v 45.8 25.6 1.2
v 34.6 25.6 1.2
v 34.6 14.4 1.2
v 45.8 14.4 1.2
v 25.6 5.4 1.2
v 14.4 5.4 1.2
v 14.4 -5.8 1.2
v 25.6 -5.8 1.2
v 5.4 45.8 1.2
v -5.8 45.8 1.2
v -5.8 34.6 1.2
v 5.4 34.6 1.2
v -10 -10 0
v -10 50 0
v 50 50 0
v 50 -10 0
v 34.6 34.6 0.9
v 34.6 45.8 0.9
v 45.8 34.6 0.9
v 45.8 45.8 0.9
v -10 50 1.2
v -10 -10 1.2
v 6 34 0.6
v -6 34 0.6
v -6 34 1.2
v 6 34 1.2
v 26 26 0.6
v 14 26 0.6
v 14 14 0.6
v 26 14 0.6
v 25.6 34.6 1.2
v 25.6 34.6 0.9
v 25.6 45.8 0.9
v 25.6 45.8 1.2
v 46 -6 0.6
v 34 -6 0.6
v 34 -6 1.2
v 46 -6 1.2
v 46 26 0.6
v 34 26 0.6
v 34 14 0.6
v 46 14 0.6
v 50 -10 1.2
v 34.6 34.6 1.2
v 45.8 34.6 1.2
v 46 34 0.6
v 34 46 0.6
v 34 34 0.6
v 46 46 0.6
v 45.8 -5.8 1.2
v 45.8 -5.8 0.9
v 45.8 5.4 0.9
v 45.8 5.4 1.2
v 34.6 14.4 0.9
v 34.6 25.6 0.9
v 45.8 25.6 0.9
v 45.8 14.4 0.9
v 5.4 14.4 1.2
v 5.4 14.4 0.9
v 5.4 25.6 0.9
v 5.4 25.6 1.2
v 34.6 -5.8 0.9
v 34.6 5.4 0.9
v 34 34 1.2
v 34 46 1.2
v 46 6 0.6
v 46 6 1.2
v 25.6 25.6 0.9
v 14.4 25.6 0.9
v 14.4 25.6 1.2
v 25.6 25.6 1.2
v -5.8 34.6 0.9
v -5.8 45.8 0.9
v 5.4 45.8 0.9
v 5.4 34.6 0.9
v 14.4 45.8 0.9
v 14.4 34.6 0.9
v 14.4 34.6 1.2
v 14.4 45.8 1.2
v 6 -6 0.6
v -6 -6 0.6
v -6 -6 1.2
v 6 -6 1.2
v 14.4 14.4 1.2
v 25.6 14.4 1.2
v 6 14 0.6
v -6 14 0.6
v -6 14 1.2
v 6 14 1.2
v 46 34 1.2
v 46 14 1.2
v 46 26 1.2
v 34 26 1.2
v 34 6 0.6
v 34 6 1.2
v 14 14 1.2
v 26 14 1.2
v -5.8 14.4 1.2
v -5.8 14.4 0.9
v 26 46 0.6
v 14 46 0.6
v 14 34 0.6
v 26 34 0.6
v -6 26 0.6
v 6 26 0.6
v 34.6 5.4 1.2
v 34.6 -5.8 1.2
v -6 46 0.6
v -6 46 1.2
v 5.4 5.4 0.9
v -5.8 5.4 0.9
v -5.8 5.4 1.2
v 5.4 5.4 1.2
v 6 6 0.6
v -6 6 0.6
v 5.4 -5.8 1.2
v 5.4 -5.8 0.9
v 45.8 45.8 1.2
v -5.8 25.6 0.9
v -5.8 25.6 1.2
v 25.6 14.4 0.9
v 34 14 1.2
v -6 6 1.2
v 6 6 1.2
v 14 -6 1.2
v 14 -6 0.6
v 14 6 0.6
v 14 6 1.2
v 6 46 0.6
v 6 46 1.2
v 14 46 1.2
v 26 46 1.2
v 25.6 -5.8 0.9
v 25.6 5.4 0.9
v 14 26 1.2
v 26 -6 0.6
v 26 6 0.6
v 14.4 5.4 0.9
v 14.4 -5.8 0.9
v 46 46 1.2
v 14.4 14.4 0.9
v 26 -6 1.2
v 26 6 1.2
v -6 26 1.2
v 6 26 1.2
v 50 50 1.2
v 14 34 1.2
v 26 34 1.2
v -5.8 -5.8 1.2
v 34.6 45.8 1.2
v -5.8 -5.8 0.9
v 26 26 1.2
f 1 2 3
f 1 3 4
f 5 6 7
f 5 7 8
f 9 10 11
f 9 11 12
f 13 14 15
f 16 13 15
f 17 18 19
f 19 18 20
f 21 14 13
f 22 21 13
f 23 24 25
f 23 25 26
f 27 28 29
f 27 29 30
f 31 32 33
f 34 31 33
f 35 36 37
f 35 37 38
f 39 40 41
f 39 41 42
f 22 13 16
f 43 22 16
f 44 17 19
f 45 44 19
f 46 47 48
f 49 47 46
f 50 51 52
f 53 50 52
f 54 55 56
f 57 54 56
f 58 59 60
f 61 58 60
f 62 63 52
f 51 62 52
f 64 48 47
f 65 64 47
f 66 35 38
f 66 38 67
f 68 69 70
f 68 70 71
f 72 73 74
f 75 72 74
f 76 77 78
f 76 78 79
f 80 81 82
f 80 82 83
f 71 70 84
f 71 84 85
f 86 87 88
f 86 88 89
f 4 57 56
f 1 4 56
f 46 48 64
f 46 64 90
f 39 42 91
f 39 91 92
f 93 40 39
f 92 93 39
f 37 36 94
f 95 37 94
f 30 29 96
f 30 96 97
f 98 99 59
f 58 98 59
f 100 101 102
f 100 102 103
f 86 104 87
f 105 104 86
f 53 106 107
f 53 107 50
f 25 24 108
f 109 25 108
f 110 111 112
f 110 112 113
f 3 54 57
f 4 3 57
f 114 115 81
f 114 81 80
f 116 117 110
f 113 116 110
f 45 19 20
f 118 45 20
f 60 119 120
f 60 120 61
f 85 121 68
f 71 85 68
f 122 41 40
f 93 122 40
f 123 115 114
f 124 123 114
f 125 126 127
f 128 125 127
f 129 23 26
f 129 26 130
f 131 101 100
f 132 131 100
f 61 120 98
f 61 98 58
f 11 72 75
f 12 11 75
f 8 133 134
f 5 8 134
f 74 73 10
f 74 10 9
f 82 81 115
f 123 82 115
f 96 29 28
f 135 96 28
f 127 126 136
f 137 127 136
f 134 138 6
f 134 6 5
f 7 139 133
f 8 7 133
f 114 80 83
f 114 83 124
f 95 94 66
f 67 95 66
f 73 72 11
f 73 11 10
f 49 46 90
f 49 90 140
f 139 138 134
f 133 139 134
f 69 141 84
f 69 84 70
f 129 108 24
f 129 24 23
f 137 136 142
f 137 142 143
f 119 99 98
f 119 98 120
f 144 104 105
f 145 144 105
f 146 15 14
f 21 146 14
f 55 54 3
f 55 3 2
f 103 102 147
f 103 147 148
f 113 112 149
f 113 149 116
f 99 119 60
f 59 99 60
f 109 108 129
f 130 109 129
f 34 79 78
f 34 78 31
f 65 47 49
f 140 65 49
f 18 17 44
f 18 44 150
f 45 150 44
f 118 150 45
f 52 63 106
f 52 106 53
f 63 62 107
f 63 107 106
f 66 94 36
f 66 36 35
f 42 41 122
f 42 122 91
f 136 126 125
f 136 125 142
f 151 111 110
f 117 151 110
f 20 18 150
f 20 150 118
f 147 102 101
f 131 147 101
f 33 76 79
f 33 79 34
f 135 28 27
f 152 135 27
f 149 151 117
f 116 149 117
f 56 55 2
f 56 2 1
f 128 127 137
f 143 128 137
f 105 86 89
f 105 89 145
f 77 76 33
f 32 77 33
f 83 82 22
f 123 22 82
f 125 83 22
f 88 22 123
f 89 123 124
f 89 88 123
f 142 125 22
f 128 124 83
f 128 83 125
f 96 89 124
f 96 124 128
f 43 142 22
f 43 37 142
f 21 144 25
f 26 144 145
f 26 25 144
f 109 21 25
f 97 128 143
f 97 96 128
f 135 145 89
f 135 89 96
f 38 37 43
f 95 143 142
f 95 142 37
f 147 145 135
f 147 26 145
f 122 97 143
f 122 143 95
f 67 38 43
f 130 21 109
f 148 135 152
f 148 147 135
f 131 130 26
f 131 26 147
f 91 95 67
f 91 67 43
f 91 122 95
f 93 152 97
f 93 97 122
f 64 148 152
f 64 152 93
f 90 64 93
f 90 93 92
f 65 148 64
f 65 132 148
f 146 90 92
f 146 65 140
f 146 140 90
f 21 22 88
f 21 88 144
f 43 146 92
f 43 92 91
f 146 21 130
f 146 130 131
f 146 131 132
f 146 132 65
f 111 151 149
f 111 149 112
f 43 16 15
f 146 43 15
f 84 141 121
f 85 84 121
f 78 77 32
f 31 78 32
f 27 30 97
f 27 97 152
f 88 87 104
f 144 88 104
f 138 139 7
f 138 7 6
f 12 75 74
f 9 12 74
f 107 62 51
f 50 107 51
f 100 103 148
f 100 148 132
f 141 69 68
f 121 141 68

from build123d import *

# Parameters (mm, degrees)
F0_W     = 11.2
F0_H     = 11.2
F1_DEPTH = 1.2
F2_DEPTH = 0.9
F0_W_2   = 20
F0_H_2   = 20
F0_W_3   = 12
F0_H_3   = 12
F3_DEPTH = 1.2
F4_DEPTH = 0.6


with BuildPart() as f1:
    # F0 (on Top) → F1 (new body)
    with BuildSketch(Plane.XY):
        with Locations((-0.2, 40.2)):
            Rectangle(F0_W, F0_H)
    extrude(amount=F1_DEPTH)


with BuildPart() as f1b:
    # F0 (on Top) → F1, piece 2 (new body)
    with BuildSketch(Plane.XY):
        with Locations((20, 40.2)):
            Rectangle(F0_W, F0_H)
    extrude(amount=F1_DEPTH)


with BuildPart() as f1c:
    # F0 (on Top) → F1, piece 3 (new body)
    with BuildSketch(Plane.XY):
        with Locations((40.2, 40.2)):
            Rectangle(F0_W, F0_H)
    extrude(amount=F1_DEPTH)


with BuildPart() as f1d:
    # F0 (on Top) → F1, piece 4 (new body)
    with BuildSketch(Plane.XY):
        with Locations((40.2, 20)):
            Rectangle(F0_W, F0_H)
    extrude(amount=F1_DEPTH)


with BuildPart() as f1e:
    # F0 (on Top) → F1, piece 5 (new body)
    with BuildSketch(Plane.XY):
        with Locations((20, 20)):
            Rectangle(F0_W, F0_H)
    extrude(amount=F1_DEPTH)


with BuildPart() as f1f:
    # F0 (on Top) → F1, piece 6 (new body)
    with BuildSketch(Plane.XY):
        with Locations((-0.2, 20)):
            Rectangle(F0_W, F0_H)
    extrude(amount=F1_DEPTH)


with BuildPart() as f1g:
    # F0 (on Top) → F1, piece 7 (new body)
    with BuildSketch(Plane.XY):
        with Locations((-0.2, -0.2)):
            Rectangle(F0_W, F0_H)
    extrude(amount=F1_DEPTH)


with BuildPart() as f1h:
    # F0 (on Top) → F1, piece 8 (new body)
    with BuildSketch(Plane.XY):
        with Locations((20, -0.2)):
            Rectangle(F0_W, F0_H)
    extrude(amount=F1_DEPTH)


with BuildPart() as f1i:
    # F0 (on Top) → F1, piece 9 (new body)
    with BuildSketch(Plane.XY):
        with Locations((40.2, -0.2)):
            Rectangle(F0_W, F0_H)
    extrude(amount=F1_DEPTH)


with BuildPart() as f2_tool:
    # F0 (on Top) → F2 (new body)
    with BuildSketch(Plane.XY):
        with Locations((-0.2, -0.2)):
            Rectangle(F0_W, F0_H)
        with Locations((20, -0.2)):
            Rectangle(F0_W, F0_H)
        with Locations((40.2, -0.2)):
            Rectangle(F0_W, F0_H)
        with Locations((-0.2, 20)):
            Rectangle(F0_W, F0_H)
        with Locations((20, 20)):
            Rectangle(F0_W, F0_H)
        with Locations((40.2, 20)):
            Rectangle(F0_W, F0_H)
        with Locations((-0.2, 40.2)):
            Rectangle(F0_W, F0_H)
        with Locations((20, 40.2)):
            Rectangle(F0_W, F0_H)
        with Locations((40.2, 40.2)):
            Rectangle(F0_W, F0_H)
    extrude(amount=F2_DEPTH)


with BuildPart() as f1_1:
    add(f1.part)

    # F2: cut by f2_tool
    add(f2_tool.part, mode=Mode.SUBTRACT)


with BuildPart() as f1b_1:
    add(f1b.part)

    # F2: cut by f2_tool
    add(f2_tool.part, mode=Mode.SUBTRACT)


with BuildPart() as f1c_1:
    add(f1c.part)

    # F2: cut by f2_tool
    add(f2_tool.part, mode=Mode.SUBTRACT)


with BuildPart() as f1d_1:
    add(f1d.part)

    # F2: cut by f2_tool
    add(f2_tool.part, mode=Mode.SUBTRACT)


with BuildPart() as f1e_1:
    add(f1e.part)

    # F2: cut by f2_tool
    add(f2_tool.part, mode=Mode.SUBTRACT)


with BuildPart() as f1f_1:
    add(f1f.part)

    # F2: cut by f2_tool
    add(f2_tool.part, mode=Mode.SUBTRACT)


with BuildPart() as f1g_1:
    add(f1g.part)

    # F2: cut by f2_tool
    add(f2_tool.part, mode=Mode.SUBTRACT)


with BuildPart() as f1h_1:
    add(f1h.part)

    # F2: cut by f2_tool
    add(f2_tool.part, mode=Mode.SUBTRACT)


with BuildPart() as f1i_1:
    add(f1i.part)

    # F2: cut by f2_tool
    add(f2_tool.part, mode=Mode.SUBTRACT)


with BuildPart() as f3:
    # F0 (on Top) → F3 (new body)
    with BuildSketch(Plane.XY):
        with Locations((0, 40)):
            Rectangle(F0_W_2, F0_H_2)
        with Locations((0, 40)):
            Rectangle(F0_W_3, F0_H_3, mode=Mode.SUBTRACT)
        with Locations((20, 40)):
            Rectangle(F0_W_2, F0_H_2)
        with Locations((20, 40)):
            Rectangle(F0_W_3, F0_H_3, mode=Mode.SUBTRACT)
        with Locations((40, 40)):
            Rectangle(F0_W_2, F0_H_2)
        with Locations((40, 40)):
            Rectangle(F0_W_3, F0_H_3, mode=Mode.SUBTRACT)
        with Locations((40, 20)):
            Rectangle(F0_W_2, F0_H_2)
        with Locations((40, 20)):
            Rectangle(F0_W_3, F0_H_3, mode=Mode.SUBTRACT)
        with Locations((20, 20)):
            Rectangle(F0_W_2, F0_H_2)
        with Locations((20, 20)):
            Rectangle(F0_W_3, F0_H_3, mode=Mode.SUBTRACT)
        with Locations((0, 20)):
            Rectangle(F0_W_2, F0_H_2)
        with Locations((0, 20)):
            Rectangle(F0_W_3, F0_H_3, mode=Mode.SUBTRACT)
        Rectangle(F0_W_2, F0_H_2)
        Rectangle(F0_W_3, F0_H_3, mode=Mode.SUBTRACT)
        with Locations((20, 0)):
            Rectangle(F0_W_2, F0_H_2)
        with Locations((20, 0)):
            Rectangle(F0_W_3, F0_H_3, mode=Mode.SUBTRACT)
        with Locations((40, 0)):
            Rectangle(F0_W_2, F0_H_2)
        with Locations((40, 0)):
            Rectangle(F0_W_3, F0_H_3, mode=Mode.SUBTRACT)
    extrude(amount=F3_DEPTH)

    # F0 (on Top) → F4 (join)
    with BuildSketch(Plane.XY):
        with Locations((40, 40)):
            Rectangle(F0_W_2, F0_H_2)
        with Locations((40, 40)):
            Rectangle(F0_W_3, F0_H_3, mode=Mode.SUBTRACT)
        with Locations((40, 20)):
            Rectangle(F0_W_2, F0_H_2)
        with Locations((40, 20)):
            Rectangle(F0_W_3, F0_H_3, mode=Mode.SUBTRACT)
        with Locations((40, 0)):
            Rectangle(F0_W_2, F0_H_2)
        with Locations((40, 0)):
            Rectangle(F0_W_3, F0_H_3, mode=Mode.SUBTRACT)
        with Locations((20, 0)):
            Rectangle(F0_W_2, F0_H_2)
        with Locations((20, 0)):
            Rectangle(F0_W_3, F0_H_3, mode=Mode.SUBTRACT)
        with Locations((20, 20)):
            Rectangle(F0_W_2, F0_H_2)
        with Locations((20, 20)):
            Rectangle(F0_W_3, F0_H_3, mode=Mode.SUBTRACT)
        with Locations((20, 40)):
            Rectangle(F0_W_2, F0_H_2)
        with Locations((20, 40)):
            Rectangle(F0_W_3, F0_H_3, mode=Mode.SUBTRACT)
        with Locations((0, 40)):
            Rectangle(F0_W_2, F0_H_2)
        with Locations((0, 40)):
            Rectangle(F0_W_3, F0_H_3, mode=Mode.SUBTRACT)
        with Locations((0, 20)):
            Rectangle(F0_W_2, F0_H_2)
        with Locations((0, 20)):
            Rectangle(F0_W_3, F0_H_3, mode=Mode.SUBTRACT)
        Rectangle(F0_W_2, F0_H_2)
        Rectangle(F0_W_3, F0_H_3, mode=Mode.SUBTRACT)
        with Locations((40, 40)):
            Rectangle(F0_W_3, F0_H_3)
        with Locations((40.2, 40.2)):
            Rectangle(F0_W, F0_H, mode=Mode.SUBTRACT)
        with Locations((40, 20)):
            Rectangle(F0_W_3, F0_H_3)
        with Locations((40.2, 20)):
            Rectangle(F0_W, F0_H, mode=Mode.SUBTRACT)
        with Locations((0, 40)):
            Rectangle(F0_W_3, F0_H_3)
        with Locations((-0.2, 40.2)):
            Rectangle(F0_W, F0_H, mode=Mode.SUBTRACT)
        with Locations((20, 40)):
            Rectangle(F0_W_3, F0_H_3)
        with Locations((20, 40.2)):
            Rectangle(F0_W, F0_H, mode=Mode.SUBTRACT)
        with Locations((20, 20)):
            Rectangle(F0_W_3, F0_H_3)
        with Locations((20, 20)):
            Rectangle(F0_W, F0_H, mode=Mode.SUBTRACT)
        with Locations((0, 20)):
            Rectangle(F0_W_3, F0_H_3)
        with Locations((-0.2, 20)):
            Rectangle(F0_W, F0_H, mode=Mode.SUBTRACT)
        Rectangle(F0_W_3, F0_H_3)
        with Locations((-0.2, -0.2)):
            Rectangle(F0_W, F0_H, mode=Mode.SUBTRACT)
        with Locations((20, 0)):
            Rectangle(F0_W_3, F0_H_3)
        with Locations((20, -0.2)):
            Rectangle(F0_W, F0_H, mode=Mode.SUBTRACT)
        with Locations((40, 0)):
            Rectangle(F0_W_3, F0_H_3)
        with Locations((40.2, -0.2)):
            Rectangle(F0_W, F0_H, mode=Mode.SUBTRACT)
        with Locations((40.2, 40.2)):
            Rectangle(F0_W, F0_H)
        with Locations((40.2, 20)):
            Rectangle(F0_W, F0_H)
        with Locations((-0.2, -0.2)):
            Rectangle(F0_W, F0_H)
        with Locations((20, -0.2)):
            Rectangle(F0_W, F0_H)
        with Locations((40.2, -0.2)):
            Rectangle(F0_W, F0_H)
        with Locations((20, 20)):
            Rectangle(F0_W, F0_H)
        with Locations((20, 40.2)):
            Rectangle(F0_W, F0_H)
        with Locations((-0.2, 20)):
            Rectangle(F0_W, F0_H)
        with Locations((-0.2, 40.2)):
            Rectangle(F0_W, F0_H)
    extrude(amount=F4_DEPTH)


solid = Compound([f1_1.part, f1b_1.part, f1c_1.part, f1d_1.part, f1e_1.part, f1f_1.part, f1g_1.part, f1h_1.part, f1i_1.part, f3.part])
